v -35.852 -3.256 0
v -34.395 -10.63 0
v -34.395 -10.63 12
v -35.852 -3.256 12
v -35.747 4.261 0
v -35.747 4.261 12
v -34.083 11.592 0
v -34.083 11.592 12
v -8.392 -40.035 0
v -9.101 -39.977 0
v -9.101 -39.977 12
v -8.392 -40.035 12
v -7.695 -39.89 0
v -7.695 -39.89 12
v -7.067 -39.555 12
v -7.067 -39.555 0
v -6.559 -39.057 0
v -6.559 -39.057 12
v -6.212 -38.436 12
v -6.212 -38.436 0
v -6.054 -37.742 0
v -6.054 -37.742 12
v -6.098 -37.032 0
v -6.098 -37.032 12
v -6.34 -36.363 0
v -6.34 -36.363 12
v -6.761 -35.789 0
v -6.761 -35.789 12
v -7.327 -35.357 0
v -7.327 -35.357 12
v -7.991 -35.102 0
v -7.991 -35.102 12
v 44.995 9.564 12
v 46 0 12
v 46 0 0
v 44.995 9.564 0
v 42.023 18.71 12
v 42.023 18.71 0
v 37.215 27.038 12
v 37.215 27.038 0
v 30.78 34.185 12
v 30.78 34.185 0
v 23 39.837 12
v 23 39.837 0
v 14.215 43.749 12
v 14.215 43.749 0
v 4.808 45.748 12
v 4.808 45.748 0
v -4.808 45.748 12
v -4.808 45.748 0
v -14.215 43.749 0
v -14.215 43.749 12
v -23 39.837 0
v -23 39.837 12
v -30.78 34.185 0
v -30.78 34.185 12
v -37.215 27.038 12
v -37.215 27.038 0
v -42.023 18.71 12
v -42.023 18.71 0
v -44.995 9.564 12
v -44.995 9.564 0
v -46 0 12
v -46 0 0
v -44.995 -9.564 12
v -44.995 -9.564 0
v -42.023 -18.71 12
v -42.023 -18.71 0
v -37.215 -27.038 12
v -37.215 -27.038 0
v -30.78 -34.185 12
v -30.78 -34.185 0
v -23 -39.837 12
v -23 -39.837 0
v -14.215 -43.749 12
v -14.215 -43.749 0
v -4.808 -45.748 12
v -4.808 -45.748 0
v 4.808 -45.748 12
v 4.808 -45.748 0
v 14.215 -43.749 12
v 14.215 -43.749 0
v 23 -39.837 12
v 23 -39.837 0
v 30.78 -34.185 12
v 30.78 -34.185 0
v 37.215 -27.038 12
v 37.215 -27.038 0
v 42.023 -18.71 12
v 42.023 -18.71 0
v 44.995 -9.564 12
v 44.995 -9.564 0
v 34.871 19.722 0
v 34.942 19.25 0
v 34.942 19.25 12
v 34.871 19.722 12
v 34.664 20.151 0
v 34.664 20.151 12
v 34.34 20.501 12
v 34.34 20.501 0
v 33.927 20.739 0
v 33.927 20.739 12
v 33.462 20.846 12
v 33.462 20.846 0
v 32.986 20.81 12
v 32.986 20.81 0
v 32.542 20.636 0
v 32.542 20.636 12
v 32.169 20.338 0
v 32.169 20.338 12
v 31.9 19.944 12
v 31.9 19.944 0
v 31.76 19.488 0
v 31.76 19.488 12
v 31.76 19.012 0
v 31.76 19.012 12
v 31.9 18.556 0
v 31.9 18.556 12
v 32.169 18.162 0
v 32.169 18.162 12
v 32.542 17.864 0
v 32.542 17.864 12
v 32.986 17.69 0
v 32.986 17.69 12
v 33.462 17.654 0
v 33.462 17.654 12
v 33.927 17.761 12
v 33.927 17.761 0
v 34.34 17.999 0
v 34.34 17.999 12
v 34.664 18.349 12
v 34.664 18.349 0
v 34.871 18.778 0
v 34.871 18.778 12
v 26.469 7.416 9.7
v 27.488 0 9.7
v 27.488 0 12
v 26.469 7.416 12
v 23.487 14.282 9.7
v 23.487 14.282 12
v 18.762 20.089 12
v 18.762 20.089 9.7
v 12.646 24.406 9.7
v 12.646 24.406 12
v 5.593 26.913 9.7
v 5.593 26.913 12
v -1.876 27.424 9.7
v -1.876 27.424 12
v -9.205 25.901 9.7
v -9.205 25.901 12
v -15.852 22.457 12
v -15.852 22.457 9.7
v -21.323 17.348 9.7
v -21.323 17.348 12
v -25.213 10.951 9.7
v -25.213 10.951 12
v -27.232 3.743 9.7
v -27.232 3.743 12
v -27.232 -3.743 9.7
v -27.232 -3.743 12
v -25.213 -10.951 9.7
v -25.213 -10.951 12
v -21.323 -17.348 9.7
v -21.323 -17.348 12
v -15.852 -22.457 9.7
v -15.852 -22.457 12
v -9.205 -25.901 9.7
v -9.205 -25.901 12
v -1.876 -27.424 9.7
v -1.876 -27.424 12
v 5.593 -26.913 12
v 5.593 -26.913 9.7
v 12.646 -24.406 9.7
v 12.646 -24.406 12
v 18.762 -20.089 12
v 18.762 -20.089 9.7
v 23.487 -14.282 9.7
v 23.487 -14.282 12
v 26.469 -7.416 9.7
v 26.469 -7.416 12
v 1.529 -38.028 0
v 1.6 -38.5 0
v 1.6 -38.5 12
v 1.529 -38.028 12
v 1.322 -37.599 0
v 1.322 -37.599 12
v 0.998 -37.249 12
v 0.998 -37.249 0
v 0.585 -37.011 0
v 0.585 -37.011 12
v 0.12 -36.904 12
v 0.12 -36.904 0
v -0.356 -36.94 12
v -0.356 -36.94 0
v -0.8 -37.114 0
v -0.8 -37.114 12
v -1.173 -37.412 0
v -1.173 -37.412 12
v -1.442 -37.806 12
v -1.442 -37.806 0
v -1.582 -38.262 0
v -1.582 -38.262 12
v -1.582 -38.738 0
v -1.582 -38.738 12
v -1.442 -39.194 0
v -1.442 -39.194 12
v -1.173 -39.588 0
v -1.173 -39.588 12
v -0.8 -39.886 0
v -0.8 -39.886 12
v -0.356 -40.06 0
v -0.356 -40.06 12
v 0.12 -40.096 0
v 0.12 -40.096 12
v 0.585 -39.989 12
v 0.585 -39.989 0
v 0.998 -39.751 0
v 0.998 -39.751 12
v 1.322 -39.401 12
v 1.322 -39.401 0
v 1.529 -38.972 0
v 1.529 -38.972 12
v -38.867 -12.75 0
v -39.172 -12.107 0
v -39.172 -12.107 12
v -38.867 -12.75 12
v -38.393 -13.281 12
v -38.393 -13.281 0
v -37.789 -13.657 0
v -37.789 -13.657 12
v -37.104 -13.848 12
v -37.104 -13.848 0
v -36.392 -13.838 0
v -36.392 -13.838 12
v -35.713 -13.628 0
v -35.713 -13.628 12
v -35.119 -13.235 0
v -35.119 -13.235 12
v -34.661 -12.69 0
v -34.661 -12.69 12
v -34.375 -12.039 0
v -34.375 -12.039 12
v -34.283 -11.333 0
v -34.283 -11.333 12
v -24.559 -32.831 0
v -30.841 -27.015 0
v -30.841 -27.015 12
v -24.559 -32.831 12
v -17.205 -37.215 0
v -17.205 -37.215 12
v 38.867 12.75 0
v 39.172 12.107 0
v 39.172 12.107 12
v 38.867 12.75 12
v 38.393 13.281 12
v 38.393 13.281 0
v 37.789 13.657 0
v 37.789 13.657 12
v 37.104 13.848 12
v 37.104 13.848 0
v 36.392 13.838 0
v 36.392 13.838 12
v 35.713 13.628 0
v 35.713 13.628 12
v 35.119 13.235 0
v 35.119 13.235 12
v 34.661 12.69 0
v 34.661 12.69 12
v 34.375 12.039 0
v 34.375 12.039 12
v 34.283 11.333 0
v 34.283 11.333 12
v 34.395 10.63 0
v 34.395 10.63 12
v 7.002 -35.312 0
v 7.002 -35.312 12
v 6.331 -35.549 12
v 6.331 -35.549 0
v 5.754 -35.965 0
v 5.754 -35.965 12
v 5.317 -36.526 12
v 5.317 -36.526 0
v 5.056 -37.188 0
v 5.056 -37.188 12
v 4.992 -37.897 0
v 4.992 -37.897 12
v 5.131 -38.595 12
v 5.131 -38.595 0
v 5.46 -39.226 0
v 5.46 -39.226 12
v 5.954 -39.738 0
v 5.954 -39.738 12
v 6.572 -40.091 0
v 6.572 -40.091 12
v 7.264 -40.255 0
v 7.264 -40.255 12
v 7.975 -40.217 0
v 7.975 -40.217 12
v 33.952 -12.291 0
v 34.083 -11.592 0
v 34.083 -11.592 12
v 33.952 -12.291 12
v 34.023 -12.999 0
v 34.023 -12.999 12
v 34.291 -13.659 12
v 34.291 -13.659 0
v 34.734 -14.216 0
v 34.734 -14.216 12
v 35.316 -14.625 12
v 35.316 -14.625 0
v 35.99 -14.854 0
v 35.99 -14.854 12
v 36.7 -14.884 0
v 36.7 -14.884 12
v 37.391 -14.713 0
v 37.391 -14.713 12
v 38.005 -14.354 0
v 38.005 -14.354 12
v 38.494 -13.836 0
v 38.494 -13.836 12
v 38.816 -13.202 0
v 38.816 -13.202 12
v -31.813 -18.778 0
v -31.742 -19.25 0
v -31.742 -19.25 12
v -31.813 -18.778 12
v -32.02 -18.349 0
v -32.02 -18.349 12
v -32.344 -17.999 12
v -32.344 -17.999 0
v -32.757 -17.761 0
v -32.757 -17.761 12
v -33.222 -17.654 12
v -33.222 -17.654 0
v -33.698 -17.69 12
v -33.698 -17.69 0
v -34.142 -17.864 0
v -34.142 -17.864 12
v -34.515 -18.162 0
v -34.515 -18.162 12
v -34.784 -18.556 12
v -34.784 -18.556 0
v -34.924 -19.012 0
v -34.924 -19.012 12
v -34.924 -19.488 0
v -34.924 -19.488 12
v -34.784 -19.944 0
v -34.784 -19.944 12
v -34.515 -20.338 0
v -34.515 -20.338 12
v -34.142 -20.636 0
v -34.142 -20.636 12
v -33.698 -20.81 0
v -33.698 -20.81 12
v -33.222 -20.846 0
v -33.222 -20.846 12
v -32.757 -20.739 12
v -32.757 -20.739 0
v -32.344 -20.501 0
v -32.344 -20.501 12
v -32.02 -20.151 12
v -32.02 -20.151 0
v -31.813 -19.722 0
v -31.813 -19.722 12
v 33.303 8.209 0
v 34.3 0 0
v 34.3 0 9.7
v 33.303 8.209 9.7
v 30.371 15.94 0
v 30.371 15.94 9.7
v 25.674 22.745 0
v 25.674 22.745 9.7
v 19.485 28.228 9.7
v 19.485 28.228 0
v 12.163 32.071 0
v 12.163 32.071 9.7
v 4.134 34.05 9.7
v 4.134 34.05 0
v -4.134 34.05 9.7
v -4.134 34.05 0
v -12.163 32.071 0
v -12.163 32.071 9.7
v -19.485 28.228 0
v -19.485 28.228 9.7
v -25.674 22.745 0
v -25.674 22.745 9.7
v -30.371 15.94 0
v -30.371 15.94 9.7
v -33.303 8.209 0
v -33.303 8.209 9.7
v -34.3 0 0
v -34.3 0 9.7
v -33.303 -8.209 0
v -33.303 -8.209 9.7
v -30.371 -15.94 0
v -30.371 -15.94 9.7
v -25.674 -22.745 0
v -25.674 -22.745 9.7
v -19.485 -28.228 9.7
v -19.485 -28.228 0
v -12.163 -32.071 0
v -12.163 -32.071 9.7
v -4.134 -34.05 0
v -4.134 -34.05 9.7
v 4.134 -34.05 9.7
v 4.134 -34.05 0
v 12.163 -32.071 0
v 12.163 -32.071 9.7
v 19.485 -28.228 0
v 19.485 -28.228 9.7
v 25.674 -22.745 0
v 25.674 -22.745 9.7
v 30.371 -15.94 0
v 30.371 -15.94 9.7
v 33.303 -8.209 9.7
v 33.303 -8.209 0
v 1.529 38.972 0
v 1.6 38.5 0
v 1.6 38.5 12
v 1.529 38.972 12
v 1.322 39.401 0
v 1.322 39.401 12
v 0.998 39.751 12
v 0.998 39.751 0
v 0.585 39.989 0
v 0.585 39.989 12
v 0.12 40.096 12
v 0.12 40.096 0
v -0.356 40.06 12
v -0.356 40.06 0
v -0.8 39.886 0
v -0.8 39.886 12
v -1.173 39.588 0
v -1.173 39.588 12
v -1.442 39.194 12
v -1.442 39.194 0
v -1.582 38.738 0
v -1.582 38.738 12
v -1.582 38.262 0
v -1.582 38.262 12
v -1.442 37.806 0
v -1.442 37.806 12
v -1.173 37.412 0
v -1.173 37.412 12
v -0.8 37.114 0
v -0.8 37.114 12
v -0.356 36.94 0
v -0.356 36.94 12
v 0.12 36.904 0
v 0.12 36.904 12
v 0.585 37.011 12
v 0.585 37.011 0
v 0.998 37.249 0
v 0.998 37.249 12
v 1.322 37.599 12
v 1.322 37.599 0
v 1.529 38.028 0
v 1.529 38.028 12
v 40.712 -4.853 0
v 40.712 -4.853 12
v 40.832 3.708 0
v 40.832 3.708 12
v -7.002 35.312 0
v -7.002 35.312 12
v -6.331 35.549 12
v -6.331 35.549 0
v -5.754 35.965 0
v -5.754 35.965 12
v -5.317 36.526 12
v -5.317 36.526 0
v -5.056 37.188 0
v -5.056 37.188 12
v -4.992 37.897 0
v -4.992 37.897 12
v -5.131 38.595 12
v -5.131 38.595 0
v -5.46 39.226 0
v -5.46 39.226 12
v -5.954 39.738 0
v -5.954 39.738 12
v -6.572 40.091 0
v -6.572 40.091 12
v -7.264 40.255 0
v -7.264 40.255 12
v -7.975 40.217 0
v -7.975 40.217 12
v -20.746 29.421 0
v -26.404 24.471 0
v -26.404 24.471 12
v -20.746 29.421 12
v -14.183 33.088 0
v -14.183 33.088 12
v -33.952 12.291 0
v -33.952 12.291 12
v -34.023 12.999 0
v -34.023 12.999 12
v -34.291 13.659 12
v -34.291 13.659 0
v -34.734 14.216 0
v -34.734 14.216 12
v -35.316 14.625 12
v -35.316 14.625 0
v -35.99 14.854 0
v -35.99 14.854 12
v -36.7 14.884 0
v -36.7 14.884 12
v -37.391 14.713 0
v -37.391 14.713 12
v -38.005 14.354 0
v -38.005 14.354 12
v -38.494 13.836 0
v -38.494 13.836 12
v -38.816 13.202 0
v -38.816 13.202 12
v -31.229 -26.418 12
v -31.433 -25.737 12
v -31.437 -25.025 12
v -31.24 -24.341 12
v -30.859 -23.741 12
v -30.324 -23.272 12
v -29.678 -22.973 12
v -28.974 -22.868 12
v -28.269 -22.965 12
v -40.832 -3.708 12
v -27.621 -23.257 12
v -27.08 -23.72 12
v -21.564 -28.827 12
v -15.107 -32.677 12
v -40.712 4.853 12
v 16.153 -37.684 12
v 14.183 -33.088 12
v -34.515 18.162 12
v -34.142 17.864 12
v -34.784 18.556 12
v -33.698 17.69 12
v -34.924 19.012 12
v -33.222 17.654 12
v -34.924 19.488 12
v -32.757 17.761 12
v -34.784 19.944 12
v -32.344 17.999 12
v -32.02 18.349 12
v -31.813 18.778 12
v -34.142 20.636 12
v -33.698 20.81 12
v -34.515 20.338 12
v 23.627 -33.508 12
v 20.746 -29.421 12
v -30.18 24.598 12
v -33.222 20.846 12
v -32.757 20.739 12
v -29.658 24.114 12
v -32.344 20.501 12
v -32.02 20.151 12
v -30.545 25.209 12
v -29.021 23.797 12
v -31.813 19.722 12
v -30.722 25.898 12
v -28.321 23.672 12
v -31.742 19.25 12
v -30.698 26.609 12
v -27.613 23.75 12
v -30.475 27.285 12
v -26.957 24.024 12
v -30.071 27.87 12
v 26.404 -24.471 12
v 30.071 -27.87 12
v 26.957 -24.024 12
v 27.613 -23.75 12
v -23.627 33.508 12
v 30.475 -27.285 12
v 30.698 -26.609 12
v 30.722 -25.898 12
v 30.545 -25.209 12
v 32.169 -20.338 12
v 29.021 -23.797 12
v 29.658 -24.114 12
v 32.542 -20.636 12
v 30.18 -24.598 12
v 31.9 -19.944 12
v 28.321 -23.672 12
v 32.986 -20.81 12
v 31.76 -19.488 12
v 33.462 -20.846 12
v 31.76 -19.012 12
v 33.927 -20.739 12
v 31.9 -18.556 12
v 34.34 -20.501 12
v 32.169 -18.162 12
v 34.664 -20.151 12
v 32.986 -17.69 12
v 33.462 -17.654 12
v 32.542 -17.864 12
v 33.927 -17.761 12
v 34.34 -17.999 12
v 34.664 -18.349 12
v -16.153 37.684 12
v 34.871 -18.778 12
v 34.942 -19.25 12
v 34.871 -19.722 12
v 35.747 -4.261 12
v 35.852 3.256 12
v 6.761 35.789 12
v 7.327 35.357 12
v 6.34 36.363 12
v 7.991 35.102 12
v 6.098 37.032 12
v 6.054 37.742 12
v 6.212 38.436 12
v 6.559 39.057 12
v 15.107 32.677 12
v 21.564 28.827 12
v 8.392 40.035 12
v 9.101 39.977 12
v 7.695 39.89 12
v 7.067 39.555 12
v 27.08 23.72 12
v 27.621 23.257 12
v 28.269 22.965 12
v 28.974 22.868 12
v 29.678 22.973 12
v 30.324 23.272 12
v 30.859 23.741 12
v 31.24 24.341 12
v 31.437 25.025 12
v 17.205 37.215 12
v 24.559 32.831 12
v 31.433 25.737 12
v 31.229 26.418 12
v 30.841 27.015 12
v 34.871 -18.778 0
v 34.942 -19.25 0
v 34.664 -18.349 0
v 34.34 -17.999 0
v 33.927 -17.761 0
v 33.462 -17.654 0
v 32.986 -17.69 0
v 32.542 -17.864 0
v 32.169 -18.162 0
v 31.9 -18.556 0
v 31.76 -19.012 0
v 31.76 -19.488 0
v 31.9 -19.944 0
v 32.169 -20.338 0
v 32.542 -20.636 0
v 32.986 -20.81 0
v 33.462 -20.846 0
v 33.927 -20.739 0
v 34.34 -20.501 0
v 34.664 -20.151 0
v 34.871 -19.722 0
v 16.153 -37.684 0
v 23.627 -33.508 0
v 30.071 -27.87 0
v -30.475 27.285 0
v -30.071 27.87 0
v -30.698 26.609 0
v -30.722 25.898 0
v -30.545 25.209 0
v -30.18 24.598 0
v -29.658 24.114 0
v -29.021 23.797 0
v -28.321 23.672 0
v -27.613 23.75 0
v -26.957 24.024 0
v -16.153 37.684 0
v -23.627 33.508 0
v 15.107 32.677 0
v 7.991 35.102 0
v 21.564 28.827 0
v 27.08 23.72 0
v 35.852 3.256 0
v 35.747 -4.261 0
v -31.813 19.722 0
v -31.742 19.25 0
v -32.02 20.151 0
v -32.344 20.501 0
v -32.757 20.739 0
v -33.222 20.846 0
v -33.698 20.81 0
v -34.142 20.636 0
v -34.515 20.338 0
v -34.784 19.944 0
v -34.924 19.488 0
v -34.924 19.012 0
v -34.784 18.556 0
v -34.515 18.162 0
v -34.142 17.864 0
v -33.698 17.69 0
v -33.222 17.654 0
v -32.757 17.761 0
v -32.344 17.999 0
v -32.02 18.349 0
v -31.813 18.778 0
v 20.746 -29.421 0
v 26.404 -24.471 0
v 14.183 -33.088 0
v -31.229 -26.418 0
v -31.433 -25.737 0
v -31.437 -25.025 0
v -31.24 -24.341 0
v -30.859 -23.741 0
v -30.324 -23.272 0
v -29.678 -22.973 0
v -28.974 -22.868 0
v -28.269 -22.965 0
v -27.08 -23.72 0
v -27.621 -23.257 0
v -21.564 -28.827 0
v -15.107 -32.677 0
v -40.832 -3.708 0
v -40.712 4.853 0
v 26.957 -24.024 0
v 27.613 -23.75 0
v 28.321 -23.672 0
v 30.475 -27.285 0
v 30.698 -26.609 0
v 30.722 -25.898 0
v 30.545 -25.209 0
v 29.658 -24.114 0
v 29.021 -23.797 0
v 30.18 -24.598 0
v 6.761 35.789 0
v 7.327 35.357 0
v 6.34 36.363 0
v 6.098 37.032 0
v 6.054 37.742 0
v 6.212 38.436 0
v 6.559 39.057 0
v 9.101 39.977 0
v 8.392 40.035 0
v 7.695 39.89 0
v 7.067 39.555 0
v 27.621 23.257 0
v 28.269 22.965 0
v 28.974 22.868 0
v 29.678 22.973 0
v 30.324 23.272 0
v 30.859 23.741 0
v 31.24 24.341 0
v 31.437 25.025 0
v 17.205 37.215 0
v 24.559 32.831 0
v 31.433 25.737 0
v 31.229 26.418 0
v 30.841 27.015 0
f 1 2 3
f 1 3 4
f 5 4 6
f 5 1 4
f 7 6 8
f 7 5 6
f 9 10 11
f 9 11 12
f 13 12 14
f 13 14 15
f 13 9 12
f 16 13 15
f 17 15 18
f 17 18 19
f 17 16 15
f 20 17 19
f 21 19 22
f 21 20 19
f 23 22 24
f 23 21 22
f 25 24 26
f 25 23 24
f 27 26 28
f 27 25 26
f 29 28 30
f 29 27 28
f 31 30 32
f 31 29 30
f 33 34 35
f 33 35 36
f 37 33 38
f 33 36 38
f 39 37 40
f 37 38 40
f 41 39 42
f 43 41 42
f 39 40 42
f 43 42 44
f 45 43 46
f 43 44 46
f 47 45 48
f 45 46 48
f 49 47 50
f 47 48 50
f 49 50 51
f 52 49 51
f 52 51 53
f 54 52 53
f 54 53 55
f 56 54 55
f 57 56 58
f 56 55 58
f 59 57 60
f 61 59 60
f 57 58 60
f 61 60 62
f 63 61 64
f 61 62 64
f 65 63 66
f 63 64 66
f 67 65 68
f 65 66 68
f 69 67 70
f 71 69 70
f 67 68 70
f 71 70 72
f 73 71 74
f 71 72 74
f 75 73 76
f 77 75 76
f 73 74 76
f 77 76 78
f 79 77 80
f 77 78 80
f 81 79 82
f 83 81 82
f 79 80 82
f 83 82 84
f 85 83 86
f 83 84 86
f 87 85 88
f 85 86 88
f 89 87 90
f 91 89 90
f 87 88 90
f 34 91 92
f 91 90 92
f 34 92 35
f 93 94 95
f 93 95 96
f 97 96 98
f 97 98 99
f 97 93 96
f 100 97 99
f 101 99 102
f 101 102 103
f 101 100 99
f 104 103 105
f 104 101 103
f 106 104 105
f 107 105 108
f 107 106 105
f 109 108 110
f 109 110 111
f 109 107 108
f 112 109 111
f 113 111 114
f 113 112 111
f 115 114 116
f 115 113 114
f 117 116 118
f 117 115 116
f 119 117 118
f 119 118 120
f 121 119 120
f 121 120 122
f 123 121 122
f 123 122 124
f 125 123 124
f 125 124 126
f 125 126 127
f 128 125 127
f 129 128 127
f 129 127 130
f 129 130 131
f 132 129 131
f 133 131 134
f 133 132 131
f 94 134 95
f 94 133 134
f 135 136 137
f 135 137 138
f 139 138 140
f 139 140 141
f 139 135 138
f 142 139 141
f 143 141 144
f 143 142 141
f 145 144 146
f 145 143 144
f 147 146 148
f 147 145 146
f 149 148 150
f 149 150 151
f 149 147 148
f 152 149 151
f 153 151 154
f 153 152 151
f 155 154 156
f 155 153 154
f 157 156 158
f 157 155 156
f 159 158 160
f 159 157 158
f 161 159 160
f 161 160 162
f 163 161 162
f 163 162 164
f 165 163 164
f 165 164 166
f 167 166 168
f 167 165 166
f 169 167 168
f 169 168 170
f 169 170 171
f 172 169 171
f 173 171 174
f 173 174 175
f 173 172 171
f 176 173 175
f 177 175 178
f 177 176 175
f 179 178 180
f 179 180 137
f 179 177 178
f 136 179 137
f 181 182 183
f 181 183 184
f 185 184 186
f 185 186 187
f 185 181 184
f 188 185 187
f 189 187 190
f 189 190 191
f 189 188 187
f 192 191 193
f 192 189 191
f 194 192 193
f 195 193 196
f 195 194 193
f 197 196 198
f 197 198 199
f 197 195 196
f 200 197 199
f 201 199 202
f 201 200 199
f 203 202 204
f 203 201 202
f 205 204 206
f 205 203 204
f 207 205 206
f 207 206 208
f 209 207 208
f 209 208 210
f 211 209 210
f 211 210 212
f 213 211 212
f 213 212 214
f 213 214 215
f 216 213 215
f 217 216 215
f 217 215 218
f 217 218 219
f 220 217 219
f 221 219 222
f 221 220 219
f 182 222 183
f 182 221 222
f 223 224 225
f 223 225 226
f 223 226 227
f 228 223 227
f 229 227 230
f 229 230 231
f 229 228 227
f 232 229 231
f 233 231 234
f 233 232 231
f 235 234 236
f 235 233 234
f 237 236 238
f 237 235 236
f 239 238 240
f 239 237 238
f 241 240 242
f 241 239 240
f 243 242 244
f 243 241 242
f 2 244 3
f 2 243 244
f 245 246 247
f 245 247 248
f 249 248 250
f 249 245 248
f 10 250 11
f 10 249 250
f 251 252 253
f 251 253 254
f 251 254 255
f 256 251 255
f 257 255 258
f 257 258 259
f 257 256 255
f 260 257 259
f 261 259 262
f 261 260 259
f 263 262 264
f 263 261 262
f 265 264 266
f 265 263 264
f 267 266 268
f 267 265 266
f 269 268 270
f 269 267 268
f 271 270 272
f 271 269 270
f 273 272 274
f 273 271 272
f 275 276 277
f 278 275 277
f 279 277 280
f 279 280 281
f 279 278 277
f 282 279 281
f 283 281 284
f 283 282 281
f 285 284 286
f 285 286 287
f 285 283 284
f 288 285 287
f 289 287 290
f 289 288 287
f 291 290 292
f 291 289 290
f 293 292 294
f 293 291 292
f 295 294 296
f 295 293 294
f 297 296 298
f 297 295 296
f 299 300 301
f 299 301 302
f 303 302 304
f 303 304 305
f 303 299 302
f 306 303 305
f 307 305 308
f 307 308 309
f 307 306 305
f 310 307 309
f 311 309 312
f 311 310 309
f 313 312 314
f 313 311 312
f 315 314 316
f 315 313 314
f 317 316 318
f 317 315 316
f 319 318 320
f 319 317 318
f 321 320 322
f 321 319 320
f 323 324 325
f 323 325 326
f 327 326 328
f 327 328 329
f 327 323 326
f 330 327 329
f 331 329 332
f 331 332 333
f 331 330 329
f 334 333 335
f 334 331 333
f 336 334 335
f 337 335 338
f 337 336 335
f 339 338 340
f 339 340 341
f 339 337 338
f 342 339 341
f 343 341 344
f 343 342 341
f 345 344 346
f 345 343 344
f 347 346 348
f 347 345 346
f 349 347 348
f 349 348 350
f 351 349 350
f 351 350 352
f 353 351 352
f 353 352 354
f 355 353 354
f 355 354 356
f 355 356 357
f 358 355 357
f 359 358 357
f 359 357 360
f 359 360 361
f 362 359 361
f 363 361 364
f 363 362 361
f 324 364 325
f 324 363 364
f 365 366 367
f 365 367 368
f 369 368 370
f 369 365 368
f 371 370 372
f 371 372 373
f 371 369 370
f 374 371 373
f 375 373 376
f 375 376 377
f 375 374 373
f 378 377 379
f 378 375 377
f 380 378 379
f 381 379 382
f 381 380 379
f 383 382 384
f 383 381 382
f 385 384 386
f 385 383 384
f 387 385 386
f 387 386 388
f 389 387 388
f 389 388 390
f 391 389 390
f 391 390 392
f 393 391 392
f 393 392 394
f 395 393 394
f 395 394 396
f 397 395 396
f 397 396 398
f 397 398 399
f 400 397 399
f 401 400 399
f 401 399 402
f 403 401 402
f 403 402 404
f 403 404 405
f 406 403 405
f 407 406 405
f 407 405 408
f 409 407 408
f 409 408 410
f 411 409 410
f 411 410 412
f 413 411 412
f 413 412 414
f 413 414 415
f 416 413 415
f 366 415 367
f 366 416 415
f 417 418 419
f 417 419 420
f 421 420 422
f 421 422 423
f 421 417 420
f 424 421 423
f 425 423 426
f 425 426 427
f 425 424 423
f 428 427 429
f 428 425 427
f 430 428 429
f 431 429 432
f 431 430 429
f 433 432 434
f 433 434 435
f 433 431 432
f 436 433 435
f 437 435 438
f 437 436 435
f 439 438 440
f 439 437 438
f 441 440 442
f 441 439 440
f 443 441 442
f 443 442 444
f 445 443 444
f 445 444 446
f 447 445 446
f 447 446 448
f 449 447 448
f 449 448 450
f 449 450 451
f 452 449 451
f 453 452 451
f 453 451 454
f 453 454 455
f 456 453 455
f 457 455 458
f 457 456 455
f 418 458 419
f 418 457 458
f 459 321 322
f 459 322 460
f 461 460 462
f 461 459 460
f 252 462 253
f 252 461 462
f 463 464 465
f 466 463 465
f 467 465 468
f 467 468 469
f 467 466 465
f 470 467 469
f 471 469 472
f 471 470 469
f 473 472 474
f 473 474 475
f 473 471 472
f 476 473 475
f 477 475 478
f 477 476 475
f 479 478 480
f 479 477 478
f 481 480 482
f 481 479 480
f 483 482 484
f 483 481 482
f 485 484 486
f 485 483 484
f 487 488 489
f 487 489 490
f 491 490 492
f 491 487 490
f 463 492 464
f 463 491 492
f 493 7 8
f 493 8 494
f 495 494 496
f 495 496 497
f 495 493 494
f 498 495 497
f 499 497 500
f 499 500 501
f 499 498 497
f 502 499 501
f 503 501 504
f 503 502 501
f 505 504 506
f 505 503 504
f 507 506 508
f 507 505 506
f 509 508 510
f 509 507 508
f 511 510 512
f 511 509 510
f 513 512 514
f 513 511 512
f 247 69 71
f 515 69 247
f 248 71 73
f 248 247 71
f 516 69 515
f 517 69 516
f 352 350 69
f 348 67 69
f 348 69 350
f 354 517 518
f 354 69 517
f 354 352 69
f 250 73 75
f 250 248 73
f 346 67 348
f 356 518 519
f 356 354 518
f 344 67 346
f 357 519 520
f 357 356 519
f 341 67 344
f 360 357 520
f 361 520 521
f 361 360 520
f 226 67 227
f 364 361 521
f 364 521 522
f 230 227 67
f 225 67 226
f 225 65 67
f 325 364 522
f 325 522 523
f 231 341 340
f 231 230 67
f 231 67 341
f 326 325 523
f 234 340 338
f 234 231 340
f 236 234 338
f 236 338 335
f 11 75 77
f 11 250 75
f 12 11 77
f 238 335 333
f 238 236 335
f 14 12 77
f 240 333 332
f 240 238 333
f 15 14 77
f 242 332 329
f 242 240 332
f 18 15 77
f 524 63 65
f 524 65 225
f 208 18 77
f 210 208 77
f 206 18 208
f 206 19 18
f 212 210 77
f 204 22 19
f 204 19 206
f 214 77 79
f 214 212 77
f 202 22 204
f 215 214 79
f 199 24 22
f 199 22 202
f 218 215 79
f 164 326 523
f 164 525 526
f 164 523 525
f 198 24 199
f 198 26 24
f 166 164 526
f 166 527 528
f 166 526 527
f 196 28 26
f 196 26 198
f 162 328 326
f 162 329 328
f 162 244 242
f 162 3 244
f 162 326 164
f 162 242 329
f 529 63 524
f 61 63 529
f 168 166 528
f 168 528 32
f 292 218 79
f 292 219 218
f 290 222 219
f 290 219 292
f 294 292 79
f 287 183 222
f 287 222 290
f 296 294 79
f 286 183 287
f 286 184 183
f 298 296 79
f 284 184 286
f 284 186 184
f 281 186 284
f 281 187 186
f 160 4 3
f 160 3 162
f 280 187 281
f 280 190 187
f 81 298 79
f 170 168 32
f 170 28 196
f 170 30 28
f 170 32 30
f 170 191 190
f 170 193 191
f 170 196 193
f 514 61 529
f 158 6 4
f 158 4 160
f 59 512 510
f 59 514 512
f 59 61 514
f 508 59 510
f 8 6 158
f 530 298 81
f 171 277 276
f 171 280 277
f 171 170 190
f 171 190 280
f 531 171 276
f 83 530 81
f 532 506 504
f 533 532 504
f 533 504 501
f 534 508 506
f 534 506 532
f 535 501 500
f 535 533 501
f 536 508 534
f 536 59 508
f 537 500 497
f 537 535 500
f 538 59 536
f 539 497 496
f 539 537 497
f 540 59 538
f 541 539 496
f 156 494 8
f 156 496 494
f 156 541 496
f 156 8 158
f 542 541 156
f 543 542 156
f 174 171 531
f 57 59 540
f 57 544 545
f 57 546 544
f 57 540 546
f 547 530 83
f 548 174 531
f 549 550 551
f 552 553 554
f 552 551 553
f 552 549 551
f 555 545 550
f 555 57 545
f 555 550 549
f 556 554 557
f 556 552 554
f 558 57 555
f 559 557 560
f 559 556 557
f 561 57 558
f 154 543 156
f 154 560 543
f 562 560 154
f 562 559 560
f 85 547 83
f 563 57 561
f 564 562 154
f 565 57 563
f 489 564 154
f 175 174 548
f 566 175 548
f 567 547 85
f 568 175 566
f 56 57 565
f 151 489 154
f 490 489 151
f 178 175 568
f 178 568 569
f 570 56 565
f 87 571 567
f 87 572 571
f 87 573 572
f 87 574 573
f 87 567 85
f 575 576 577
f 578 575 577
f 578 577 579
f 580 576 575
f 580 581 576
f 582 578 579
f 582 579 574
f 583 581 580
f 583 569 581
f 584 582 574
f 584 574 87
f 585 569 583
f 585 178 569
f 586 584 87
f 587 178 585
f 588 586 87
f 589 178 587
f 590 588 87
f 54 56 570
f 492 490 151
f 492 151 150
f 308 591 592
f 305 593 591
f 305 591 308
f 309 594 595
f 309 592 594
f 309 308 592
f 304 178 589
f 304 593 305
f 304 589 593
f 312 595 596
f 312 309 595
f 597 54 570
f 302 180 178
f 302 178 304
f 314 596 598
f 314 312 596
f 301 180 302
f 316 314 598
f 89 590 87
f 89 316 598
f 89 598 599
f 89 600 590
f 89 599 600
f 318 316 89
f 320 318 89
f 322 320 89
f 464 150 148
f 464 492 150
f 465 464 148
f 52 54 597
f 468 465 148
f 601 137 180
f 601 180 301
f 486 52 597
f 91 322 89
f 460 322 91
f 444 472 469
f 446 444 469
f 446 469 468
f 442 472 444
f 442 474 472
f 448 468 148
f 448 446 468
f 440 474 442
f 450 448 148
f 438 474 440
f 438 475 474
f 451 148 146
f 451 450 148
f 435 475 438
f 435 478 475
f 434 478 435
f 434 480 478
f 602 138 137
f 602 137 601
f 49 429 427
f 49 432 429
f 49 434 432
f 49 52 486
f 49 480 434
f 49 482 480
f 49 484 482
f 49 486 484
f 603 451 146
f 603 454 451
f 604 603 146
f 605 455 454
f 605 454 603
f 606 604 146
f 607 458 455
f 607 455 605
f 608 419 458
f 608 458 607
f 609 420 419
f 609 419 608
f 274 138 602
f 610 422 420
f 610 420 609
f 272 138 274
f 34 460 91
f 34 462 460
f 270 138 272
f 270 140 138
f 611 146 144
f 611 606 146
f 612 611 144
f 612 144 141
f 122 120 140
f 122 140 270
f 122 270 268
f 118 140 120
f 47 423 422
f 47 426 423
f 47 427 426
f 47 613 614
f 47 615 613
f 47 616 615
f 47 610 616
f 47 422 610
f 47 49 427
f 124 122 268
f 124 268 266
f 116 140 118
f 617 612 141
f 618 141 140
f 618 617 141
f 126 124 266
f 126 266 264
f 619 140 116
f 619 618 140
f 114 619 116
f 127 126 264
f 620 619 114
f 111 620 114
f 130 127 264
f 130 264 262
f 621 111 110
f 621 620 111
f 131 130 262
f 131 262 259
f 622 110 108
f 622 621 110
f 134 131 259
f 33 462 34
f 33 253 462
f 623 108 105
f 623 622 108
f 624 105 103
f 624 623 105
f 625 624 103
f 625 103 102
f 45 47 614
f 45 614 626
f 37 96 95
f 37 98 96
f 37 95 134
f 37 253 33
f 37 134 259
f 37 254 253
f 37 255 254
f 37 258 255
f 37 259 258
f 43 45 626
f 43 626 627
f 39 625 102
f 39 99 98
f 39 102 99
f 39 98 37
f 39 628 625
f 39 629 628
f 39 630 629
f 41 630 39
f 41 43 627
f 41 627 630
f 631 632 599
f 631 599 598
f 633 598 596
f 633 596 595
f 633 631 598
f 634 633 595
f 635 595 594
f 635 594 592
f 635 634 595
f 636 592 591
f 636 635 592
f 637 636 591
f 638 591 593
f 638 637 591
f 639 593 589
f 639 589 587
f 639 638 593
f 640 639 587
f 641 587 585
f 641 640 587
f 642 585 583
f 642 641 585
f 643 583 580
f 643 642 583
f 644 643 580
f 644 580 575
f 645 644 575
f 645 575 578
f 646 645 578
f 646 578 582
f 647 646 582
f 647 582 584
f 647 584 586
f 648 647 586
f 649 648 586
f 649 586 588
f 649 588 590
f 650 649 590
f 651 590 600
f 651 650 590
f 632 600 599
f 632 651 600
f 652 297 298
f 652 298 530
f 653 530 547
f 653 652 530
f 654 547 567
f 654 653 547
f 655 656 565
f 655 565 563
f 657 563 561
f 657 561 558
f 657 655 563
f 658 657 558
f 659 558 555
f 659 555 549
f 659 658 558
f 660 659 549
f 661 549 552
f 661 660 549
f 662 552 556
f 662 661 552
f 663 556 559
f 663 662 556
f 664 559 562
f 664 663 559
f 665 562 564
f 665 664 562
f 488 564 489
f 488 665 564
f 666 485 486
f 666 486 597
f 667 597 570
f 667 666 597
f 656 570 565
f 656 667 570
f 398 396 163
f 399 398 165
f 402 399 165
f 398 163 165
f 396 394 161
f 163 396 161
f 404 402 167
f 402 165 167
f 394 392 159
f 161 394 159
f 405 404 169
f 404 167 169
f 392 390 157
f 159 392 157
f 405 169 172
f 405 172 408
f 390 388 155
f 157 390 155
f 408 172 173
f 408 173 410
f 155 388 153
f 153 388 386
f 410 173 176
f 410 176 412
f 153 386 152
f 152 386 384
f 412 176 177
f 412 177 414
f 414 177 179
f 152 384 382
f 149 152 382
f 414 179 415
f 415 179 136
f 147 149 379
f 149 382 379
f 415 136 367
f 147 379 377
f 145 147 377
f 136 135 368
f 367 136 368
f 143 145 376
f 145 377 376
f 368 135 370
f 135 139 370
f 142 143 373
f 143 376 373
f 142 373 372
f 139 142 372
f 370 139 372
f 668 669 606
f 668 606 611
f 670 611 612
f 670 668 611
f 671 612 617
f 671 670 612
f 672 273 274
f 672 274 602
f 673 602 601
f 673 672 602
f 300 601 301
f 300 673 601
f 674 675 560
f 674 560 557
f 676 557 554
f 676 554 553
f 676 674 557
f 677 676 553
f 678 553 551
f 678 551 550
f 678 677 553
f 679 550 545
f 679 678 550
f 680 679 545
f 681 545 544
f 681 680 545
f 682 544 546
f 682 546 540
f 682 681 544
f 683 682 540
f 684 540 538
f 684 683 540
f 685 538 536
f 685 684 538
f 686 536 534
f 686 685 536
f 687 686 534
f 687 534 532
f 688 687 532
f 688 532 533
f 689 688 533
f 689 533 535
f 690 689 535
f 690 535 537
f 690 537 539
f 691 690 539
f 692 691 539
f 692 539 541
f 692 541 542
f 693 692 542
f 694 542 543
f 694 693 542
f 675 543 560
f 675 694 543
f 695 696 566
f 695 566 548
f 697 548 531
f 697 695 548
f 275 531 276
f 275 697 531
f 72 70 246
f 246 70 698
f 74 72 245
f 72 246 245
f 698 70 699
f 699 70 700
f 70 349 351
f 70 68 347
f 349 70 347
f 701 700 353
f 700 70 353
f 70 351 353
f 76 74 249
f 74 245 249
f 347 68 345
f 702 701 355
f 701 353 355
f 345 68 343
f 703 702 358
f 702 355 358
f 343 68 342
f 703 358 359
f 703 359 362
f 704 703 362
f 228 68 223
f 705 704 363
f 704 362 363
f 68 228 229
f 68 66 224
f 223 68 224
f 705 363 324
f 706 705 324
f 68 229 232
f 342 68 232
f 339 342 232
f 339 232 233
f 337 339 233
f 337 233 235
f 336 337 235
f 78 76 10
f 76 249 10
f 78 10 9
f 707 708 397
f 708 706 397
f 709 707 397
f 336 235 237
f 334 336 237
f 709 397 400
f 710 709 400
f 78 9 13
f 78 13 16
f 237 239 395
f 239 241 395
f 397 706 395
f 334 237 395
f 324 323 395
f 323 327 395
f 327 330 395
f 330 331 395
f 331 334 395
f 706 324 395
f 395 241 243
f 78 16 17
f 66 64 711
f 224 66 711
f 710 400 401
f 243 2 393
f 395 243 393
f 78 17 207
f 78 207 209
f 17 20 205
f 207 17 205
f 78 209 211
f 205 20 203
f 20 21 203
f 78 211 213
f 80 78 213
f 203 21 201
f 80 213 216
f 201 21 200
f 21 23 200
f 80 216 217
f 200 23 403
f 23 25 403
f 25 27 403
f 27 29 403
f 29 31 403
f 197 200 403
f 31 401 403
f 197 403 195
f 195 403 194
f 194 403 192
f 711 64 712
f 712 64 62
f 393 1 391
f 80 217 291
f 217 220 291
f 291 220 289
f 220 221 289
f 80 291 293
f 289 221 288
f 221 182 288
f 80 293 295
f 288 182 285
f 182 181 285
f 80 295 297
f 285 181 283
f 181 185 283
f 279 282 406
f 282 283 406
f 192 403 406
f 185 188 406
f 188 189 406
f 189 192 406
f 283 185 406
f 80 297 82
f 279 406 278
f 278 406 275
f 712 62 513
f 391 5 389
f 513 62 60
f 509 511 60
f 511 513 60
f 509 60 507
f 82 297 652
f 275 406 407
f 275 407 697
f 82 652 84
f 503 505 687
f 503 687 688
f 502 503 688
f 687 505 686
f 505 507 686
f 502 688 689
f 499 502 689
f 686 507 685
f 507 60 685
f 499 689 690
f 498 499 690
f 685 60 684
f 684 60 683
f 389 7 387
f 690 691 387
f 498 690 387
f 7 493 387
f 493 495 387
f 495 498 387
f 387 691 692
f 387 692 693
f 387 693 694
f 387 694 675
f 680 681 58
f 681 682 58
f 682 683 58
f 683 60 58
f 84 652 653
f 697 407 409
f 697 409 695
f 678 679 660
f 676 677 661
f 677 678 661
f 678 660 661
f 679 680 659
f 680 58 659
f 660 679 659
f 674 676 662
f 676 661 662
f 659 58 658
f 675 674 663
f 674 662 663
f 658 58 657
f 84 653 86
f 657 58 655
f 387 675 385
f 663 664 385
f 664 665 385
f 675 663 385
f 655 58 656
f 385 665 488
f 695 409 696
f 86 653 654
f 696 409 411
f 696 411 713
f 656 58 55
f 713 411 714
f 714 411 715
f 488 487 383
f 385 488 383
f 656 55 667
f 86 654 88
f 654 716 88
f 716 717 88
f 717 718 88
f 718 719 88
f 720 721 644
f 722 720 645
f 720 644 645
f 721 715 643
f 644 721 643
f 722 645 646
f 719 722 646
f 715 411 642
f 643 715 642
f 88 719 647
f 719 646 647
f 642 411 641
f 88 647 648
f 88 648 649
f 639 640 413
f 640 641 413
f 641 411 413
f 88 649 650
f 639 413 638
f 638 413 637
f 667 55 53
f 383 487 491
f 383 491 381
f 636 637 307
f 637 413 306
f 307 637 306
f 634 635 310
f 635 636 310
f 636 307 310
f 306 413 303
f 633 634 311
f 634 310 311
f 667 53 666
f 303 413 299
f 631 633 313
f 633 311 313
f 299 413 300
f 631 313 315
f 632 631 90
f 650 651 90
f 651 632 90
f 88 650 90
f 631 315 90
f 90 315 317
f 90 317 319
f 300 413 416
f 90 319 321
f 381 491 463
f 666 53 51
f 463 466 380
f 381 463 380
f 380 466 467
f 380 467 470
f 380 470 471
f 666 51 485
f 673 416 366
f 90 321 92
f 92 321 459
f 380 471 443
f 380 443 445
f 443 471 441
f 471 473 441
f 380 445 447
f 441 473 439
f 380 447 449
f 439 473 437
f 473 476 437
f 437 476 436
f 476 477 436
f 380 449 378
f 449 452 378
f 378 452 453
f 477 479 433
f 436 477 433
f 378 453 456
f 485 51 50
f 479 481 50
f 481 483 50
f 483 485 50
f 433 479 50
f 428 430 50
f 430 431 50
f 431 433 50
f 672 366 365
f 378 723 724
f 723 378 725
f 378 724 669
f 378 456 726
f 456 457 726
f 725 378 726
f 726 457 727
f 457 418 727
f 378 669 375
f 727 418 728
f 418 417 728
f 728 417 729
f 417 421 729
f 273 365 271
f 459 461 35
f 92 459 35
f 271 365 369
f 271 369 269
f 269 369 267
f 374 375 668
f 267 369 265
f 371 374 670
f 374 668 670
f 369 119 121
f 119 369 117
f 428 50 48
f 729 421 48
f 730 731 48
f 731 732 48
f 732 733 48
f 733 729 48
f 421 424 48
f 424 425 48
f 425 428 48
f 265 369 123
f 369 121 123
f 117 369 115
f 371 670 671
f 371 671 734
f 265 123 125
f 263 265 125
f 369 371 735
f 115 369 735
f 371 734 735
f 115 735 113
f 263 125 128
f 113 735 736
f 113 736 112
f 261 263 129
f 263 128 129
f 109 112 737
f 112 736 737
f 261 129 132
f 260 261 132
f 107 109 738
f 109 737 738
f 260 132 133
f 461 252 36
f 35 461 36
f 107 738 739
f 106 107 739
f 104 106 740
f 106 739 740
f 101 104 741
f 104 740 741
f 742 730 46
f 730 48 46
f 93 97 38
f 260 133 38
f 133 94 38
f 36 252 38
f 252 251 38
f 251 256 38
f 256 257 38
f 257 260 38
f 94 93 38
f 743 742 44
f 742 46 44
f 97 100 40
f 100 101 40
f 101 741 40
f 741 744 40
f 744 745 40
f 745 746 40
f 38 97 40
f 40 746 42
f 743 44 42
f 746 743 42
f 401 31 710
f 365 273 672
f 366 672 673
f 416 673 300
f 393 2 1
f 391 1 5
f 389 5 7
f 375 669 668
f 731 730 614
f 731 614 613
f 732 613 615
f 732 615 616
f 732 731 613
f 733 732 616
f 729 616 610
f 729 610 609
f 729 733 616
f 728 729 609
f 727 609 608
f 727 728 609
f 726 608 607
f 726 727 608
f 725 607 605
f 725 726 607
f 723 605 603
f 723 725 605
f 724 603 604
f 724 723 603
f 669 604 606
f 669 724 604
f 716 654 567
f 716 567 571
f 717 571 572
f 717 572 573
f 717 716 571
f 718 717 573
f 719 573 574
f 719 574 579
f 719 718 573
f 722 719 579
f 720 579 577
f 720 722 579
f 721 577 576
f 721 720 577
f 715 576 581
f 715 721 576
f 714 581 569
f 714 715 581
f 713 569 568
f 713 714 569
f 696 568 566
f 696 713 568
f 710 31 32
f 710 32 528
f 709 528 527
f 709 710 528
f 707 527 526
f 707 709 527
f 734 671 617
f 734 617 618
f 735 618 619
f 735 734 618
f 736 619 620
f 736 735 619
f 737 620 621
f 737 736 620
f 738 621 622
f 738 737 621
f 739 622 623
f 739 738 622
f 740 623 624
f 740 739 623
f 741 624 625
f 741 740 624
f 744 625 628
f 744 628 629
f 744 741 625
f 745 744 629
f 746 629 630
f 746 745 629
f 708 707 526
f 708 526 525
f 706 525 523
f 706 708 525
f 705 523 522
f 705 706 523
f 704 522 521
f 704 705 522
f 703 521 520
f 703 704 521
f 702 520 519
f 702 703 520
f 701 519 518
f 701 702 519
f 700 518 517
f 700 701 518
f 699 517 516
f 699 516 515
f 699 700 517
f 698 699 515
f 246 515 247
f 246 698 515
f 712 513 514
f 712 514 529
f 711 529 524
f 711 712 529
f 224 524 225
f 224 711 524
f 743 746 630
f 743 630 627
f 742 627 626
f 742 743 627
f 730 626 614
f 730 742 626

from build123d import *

# Parameters (mm, degrees)
SKETCH_1_R      = 46
SKETCH_1_R_2    = 34.3
SKETCH_1_R_3    = 1.6
EXTRUDE_1_DEPTH = 12
EXTRUDE_START   = -2.3
SKETCH_4_R      = 34.3
SKETCH_4_R_2    = 27.488330285
EXTRUDE_2_DEPTH = 2.3


with BuildPart() as part:
    # 草图1 → 凸台-拉伸1 (new body)
    with BuildSketch(Plane.XY):
        Circle(SKETCH_1_R)
        Circle(SKETCH_1_R_2, mode=Mode.SUBTRACT)
        with Locations((0, 38.5)):
            Circle(SKETCH_1_R_3, mode=Mode.SUBTRACT)
        with Locations((33.341978046, 19.25)):
            Circle(SKETCH_1_R_3, mode=Mode.SUBTRACT)
        with Locations((33.341978046, -19.25)):
            Circle(SKETCH_1_R_3, mode=Mode.SUBTRACT)
        with Locations((0, -38.5)):
            Circle(SKETCH_1_R_3, mode=Mode.SUBTRACT)
        with Locations((-33.341978046, -19.25)):
            Circle(SKETCH_1_R_3, mode=Mode.SUBTRACT)
        with Locations((-33.341978046, 19.25)):
            Circle(SKETCH_1_R_3, mode=Mode.SUBTRACT)
        with BuildLine():
            ThreePointArc((-7.974877173, 40.216928452), (-19.999395147, 35.791398321), (-30.070678328, 27.87031225))
            ThreePointArc((-30.070678328, 27.87031225), (-29.936509665, 24.337325019), (-26.403522434, 24.471493683))
            ThreePointArc((-26.403522434, 24.471493683), (-17.56044452, 31.426593647), (-7.002331176, 35.312424982))
            ThreePointArc((-7.002331176, 35.312424982), (-5.03635244, 38.250949715), (-7.974877173, 40.216928452))
        make_face(mode=Mode.SUBTRACT)
        with BuildLine():
            ThreePointArc((30.841443115, 27.01491045), (20.996562609, 35.215683418), (9.101059256, 39.977127466))
            ThreePointArc((9.101059256, 39.977127466), (6.108486895, 38.09444038), (7.991173981, 35.101868019))
            ThreePointArc((7.991173981, 35.101868019), (18.436006193, 30.921087879), (27.080291515, 23.720409175))
            ThreePointArc((27.080291515, 23.720409175), (30.608117952, 23.487084013), (30.841443115, 27.01491045))
        make_face(mode=Mode.SUBTRACT)
        with BuildLine():
            ThreePointArc((38.816320288, -13.202018002), (40.995957756, -0.575714903), (39.171737584, 12.106815216))
            ThreePointArc((39.171737584, 12.106815216), (36.044996559, 13.757115361), (34.394696415, 10.630374336))
            ThreePointArc((34.394696415, 10.630374336), (35.996450713, -0.505505768), (34.082622692, -11.592015806))
            ThreePointArc((34.082622692, -11.592015806), (35.644470392, -14.763865702), (38.816320288, -13.202018002))
        make_face(mode=Mode.SUBTRACT)
        with BuildLine():
            ThreePointArc((7.974877173, -40.216928452), (19.999395147, -35.791398321), (30.070678328, -27.87031225))
            ThreePointArc((30.070678328, -27.87031225), (29.936509665, -24.337325019), (26.403522434, -24.471493683))
            ThreePointArc((26.403522434, -24.471493683), (17.56044452, -31.426593647), (7.002331176, -35.312424982))
            ThreePointArc((7.002331176, -35.312424982), (5.03635244, -38.250949715), (7.974877173, -40.216928452))
        make_face(mode=Mode.SUBTRACT)
        with BuildLine():
            ThreePointArc((-30.841443115, -27.01491045), (-20.996562609, -35.215683418), (-9.101059256, -39.977127466))
            ThreePointArc((-9.101059256, -39.977127466), (-6.108486895, -38.09444038), (-7.991173981, -35.101868019))
            ThreePointArc((-7.991173981, -35.101868019), (-18.436006193, -30.921087879), (-27.080291515, -23.720409175))
            ThreePointArc((-27.080291515, -23.720409175), (-30.608117952, -23.487084013), (-30.841443115, -27.01491045))
        make_face(mode=Mode.SUBTRACT)
        with BuildLine():
            ThreePointArc((-38.816320288, 13.202018002), (-40.995957756, 0.575714903), (-39.171737584, -12.106815216))
            ThreePointArc((-39.171737584, -12.106815216), (-36.044996559, -13.757115361), (-34.394696415, -10.630374336))
            ThreePointArc((-34.394696415, -10.630374336), (-35.996450713, 0.505505768), (-34.082622692, 11.592015806))
            ThreePointArc((-34.082622692, 11.592015806), (-35.644470392, 14.763865702), (-38.816320288, 13.202018002))
        make_face(mode=Mode.SUBTRACT)
    extrude(amount=EXTRUDE_1_DEPTH)

    # 草图4 → 凸台-拉伸2 (add)
    with BuildSketch(Plane.XY.offset(12).offset(EXTRUDE_START)):
        Circle(SKETCH_4_R)
        Circle(SKETCH_4_R_2, mode=Mode.SUBTRACT)
    extrude(amount=EXTRUDE_2_DEPTH)


solid = part.part
